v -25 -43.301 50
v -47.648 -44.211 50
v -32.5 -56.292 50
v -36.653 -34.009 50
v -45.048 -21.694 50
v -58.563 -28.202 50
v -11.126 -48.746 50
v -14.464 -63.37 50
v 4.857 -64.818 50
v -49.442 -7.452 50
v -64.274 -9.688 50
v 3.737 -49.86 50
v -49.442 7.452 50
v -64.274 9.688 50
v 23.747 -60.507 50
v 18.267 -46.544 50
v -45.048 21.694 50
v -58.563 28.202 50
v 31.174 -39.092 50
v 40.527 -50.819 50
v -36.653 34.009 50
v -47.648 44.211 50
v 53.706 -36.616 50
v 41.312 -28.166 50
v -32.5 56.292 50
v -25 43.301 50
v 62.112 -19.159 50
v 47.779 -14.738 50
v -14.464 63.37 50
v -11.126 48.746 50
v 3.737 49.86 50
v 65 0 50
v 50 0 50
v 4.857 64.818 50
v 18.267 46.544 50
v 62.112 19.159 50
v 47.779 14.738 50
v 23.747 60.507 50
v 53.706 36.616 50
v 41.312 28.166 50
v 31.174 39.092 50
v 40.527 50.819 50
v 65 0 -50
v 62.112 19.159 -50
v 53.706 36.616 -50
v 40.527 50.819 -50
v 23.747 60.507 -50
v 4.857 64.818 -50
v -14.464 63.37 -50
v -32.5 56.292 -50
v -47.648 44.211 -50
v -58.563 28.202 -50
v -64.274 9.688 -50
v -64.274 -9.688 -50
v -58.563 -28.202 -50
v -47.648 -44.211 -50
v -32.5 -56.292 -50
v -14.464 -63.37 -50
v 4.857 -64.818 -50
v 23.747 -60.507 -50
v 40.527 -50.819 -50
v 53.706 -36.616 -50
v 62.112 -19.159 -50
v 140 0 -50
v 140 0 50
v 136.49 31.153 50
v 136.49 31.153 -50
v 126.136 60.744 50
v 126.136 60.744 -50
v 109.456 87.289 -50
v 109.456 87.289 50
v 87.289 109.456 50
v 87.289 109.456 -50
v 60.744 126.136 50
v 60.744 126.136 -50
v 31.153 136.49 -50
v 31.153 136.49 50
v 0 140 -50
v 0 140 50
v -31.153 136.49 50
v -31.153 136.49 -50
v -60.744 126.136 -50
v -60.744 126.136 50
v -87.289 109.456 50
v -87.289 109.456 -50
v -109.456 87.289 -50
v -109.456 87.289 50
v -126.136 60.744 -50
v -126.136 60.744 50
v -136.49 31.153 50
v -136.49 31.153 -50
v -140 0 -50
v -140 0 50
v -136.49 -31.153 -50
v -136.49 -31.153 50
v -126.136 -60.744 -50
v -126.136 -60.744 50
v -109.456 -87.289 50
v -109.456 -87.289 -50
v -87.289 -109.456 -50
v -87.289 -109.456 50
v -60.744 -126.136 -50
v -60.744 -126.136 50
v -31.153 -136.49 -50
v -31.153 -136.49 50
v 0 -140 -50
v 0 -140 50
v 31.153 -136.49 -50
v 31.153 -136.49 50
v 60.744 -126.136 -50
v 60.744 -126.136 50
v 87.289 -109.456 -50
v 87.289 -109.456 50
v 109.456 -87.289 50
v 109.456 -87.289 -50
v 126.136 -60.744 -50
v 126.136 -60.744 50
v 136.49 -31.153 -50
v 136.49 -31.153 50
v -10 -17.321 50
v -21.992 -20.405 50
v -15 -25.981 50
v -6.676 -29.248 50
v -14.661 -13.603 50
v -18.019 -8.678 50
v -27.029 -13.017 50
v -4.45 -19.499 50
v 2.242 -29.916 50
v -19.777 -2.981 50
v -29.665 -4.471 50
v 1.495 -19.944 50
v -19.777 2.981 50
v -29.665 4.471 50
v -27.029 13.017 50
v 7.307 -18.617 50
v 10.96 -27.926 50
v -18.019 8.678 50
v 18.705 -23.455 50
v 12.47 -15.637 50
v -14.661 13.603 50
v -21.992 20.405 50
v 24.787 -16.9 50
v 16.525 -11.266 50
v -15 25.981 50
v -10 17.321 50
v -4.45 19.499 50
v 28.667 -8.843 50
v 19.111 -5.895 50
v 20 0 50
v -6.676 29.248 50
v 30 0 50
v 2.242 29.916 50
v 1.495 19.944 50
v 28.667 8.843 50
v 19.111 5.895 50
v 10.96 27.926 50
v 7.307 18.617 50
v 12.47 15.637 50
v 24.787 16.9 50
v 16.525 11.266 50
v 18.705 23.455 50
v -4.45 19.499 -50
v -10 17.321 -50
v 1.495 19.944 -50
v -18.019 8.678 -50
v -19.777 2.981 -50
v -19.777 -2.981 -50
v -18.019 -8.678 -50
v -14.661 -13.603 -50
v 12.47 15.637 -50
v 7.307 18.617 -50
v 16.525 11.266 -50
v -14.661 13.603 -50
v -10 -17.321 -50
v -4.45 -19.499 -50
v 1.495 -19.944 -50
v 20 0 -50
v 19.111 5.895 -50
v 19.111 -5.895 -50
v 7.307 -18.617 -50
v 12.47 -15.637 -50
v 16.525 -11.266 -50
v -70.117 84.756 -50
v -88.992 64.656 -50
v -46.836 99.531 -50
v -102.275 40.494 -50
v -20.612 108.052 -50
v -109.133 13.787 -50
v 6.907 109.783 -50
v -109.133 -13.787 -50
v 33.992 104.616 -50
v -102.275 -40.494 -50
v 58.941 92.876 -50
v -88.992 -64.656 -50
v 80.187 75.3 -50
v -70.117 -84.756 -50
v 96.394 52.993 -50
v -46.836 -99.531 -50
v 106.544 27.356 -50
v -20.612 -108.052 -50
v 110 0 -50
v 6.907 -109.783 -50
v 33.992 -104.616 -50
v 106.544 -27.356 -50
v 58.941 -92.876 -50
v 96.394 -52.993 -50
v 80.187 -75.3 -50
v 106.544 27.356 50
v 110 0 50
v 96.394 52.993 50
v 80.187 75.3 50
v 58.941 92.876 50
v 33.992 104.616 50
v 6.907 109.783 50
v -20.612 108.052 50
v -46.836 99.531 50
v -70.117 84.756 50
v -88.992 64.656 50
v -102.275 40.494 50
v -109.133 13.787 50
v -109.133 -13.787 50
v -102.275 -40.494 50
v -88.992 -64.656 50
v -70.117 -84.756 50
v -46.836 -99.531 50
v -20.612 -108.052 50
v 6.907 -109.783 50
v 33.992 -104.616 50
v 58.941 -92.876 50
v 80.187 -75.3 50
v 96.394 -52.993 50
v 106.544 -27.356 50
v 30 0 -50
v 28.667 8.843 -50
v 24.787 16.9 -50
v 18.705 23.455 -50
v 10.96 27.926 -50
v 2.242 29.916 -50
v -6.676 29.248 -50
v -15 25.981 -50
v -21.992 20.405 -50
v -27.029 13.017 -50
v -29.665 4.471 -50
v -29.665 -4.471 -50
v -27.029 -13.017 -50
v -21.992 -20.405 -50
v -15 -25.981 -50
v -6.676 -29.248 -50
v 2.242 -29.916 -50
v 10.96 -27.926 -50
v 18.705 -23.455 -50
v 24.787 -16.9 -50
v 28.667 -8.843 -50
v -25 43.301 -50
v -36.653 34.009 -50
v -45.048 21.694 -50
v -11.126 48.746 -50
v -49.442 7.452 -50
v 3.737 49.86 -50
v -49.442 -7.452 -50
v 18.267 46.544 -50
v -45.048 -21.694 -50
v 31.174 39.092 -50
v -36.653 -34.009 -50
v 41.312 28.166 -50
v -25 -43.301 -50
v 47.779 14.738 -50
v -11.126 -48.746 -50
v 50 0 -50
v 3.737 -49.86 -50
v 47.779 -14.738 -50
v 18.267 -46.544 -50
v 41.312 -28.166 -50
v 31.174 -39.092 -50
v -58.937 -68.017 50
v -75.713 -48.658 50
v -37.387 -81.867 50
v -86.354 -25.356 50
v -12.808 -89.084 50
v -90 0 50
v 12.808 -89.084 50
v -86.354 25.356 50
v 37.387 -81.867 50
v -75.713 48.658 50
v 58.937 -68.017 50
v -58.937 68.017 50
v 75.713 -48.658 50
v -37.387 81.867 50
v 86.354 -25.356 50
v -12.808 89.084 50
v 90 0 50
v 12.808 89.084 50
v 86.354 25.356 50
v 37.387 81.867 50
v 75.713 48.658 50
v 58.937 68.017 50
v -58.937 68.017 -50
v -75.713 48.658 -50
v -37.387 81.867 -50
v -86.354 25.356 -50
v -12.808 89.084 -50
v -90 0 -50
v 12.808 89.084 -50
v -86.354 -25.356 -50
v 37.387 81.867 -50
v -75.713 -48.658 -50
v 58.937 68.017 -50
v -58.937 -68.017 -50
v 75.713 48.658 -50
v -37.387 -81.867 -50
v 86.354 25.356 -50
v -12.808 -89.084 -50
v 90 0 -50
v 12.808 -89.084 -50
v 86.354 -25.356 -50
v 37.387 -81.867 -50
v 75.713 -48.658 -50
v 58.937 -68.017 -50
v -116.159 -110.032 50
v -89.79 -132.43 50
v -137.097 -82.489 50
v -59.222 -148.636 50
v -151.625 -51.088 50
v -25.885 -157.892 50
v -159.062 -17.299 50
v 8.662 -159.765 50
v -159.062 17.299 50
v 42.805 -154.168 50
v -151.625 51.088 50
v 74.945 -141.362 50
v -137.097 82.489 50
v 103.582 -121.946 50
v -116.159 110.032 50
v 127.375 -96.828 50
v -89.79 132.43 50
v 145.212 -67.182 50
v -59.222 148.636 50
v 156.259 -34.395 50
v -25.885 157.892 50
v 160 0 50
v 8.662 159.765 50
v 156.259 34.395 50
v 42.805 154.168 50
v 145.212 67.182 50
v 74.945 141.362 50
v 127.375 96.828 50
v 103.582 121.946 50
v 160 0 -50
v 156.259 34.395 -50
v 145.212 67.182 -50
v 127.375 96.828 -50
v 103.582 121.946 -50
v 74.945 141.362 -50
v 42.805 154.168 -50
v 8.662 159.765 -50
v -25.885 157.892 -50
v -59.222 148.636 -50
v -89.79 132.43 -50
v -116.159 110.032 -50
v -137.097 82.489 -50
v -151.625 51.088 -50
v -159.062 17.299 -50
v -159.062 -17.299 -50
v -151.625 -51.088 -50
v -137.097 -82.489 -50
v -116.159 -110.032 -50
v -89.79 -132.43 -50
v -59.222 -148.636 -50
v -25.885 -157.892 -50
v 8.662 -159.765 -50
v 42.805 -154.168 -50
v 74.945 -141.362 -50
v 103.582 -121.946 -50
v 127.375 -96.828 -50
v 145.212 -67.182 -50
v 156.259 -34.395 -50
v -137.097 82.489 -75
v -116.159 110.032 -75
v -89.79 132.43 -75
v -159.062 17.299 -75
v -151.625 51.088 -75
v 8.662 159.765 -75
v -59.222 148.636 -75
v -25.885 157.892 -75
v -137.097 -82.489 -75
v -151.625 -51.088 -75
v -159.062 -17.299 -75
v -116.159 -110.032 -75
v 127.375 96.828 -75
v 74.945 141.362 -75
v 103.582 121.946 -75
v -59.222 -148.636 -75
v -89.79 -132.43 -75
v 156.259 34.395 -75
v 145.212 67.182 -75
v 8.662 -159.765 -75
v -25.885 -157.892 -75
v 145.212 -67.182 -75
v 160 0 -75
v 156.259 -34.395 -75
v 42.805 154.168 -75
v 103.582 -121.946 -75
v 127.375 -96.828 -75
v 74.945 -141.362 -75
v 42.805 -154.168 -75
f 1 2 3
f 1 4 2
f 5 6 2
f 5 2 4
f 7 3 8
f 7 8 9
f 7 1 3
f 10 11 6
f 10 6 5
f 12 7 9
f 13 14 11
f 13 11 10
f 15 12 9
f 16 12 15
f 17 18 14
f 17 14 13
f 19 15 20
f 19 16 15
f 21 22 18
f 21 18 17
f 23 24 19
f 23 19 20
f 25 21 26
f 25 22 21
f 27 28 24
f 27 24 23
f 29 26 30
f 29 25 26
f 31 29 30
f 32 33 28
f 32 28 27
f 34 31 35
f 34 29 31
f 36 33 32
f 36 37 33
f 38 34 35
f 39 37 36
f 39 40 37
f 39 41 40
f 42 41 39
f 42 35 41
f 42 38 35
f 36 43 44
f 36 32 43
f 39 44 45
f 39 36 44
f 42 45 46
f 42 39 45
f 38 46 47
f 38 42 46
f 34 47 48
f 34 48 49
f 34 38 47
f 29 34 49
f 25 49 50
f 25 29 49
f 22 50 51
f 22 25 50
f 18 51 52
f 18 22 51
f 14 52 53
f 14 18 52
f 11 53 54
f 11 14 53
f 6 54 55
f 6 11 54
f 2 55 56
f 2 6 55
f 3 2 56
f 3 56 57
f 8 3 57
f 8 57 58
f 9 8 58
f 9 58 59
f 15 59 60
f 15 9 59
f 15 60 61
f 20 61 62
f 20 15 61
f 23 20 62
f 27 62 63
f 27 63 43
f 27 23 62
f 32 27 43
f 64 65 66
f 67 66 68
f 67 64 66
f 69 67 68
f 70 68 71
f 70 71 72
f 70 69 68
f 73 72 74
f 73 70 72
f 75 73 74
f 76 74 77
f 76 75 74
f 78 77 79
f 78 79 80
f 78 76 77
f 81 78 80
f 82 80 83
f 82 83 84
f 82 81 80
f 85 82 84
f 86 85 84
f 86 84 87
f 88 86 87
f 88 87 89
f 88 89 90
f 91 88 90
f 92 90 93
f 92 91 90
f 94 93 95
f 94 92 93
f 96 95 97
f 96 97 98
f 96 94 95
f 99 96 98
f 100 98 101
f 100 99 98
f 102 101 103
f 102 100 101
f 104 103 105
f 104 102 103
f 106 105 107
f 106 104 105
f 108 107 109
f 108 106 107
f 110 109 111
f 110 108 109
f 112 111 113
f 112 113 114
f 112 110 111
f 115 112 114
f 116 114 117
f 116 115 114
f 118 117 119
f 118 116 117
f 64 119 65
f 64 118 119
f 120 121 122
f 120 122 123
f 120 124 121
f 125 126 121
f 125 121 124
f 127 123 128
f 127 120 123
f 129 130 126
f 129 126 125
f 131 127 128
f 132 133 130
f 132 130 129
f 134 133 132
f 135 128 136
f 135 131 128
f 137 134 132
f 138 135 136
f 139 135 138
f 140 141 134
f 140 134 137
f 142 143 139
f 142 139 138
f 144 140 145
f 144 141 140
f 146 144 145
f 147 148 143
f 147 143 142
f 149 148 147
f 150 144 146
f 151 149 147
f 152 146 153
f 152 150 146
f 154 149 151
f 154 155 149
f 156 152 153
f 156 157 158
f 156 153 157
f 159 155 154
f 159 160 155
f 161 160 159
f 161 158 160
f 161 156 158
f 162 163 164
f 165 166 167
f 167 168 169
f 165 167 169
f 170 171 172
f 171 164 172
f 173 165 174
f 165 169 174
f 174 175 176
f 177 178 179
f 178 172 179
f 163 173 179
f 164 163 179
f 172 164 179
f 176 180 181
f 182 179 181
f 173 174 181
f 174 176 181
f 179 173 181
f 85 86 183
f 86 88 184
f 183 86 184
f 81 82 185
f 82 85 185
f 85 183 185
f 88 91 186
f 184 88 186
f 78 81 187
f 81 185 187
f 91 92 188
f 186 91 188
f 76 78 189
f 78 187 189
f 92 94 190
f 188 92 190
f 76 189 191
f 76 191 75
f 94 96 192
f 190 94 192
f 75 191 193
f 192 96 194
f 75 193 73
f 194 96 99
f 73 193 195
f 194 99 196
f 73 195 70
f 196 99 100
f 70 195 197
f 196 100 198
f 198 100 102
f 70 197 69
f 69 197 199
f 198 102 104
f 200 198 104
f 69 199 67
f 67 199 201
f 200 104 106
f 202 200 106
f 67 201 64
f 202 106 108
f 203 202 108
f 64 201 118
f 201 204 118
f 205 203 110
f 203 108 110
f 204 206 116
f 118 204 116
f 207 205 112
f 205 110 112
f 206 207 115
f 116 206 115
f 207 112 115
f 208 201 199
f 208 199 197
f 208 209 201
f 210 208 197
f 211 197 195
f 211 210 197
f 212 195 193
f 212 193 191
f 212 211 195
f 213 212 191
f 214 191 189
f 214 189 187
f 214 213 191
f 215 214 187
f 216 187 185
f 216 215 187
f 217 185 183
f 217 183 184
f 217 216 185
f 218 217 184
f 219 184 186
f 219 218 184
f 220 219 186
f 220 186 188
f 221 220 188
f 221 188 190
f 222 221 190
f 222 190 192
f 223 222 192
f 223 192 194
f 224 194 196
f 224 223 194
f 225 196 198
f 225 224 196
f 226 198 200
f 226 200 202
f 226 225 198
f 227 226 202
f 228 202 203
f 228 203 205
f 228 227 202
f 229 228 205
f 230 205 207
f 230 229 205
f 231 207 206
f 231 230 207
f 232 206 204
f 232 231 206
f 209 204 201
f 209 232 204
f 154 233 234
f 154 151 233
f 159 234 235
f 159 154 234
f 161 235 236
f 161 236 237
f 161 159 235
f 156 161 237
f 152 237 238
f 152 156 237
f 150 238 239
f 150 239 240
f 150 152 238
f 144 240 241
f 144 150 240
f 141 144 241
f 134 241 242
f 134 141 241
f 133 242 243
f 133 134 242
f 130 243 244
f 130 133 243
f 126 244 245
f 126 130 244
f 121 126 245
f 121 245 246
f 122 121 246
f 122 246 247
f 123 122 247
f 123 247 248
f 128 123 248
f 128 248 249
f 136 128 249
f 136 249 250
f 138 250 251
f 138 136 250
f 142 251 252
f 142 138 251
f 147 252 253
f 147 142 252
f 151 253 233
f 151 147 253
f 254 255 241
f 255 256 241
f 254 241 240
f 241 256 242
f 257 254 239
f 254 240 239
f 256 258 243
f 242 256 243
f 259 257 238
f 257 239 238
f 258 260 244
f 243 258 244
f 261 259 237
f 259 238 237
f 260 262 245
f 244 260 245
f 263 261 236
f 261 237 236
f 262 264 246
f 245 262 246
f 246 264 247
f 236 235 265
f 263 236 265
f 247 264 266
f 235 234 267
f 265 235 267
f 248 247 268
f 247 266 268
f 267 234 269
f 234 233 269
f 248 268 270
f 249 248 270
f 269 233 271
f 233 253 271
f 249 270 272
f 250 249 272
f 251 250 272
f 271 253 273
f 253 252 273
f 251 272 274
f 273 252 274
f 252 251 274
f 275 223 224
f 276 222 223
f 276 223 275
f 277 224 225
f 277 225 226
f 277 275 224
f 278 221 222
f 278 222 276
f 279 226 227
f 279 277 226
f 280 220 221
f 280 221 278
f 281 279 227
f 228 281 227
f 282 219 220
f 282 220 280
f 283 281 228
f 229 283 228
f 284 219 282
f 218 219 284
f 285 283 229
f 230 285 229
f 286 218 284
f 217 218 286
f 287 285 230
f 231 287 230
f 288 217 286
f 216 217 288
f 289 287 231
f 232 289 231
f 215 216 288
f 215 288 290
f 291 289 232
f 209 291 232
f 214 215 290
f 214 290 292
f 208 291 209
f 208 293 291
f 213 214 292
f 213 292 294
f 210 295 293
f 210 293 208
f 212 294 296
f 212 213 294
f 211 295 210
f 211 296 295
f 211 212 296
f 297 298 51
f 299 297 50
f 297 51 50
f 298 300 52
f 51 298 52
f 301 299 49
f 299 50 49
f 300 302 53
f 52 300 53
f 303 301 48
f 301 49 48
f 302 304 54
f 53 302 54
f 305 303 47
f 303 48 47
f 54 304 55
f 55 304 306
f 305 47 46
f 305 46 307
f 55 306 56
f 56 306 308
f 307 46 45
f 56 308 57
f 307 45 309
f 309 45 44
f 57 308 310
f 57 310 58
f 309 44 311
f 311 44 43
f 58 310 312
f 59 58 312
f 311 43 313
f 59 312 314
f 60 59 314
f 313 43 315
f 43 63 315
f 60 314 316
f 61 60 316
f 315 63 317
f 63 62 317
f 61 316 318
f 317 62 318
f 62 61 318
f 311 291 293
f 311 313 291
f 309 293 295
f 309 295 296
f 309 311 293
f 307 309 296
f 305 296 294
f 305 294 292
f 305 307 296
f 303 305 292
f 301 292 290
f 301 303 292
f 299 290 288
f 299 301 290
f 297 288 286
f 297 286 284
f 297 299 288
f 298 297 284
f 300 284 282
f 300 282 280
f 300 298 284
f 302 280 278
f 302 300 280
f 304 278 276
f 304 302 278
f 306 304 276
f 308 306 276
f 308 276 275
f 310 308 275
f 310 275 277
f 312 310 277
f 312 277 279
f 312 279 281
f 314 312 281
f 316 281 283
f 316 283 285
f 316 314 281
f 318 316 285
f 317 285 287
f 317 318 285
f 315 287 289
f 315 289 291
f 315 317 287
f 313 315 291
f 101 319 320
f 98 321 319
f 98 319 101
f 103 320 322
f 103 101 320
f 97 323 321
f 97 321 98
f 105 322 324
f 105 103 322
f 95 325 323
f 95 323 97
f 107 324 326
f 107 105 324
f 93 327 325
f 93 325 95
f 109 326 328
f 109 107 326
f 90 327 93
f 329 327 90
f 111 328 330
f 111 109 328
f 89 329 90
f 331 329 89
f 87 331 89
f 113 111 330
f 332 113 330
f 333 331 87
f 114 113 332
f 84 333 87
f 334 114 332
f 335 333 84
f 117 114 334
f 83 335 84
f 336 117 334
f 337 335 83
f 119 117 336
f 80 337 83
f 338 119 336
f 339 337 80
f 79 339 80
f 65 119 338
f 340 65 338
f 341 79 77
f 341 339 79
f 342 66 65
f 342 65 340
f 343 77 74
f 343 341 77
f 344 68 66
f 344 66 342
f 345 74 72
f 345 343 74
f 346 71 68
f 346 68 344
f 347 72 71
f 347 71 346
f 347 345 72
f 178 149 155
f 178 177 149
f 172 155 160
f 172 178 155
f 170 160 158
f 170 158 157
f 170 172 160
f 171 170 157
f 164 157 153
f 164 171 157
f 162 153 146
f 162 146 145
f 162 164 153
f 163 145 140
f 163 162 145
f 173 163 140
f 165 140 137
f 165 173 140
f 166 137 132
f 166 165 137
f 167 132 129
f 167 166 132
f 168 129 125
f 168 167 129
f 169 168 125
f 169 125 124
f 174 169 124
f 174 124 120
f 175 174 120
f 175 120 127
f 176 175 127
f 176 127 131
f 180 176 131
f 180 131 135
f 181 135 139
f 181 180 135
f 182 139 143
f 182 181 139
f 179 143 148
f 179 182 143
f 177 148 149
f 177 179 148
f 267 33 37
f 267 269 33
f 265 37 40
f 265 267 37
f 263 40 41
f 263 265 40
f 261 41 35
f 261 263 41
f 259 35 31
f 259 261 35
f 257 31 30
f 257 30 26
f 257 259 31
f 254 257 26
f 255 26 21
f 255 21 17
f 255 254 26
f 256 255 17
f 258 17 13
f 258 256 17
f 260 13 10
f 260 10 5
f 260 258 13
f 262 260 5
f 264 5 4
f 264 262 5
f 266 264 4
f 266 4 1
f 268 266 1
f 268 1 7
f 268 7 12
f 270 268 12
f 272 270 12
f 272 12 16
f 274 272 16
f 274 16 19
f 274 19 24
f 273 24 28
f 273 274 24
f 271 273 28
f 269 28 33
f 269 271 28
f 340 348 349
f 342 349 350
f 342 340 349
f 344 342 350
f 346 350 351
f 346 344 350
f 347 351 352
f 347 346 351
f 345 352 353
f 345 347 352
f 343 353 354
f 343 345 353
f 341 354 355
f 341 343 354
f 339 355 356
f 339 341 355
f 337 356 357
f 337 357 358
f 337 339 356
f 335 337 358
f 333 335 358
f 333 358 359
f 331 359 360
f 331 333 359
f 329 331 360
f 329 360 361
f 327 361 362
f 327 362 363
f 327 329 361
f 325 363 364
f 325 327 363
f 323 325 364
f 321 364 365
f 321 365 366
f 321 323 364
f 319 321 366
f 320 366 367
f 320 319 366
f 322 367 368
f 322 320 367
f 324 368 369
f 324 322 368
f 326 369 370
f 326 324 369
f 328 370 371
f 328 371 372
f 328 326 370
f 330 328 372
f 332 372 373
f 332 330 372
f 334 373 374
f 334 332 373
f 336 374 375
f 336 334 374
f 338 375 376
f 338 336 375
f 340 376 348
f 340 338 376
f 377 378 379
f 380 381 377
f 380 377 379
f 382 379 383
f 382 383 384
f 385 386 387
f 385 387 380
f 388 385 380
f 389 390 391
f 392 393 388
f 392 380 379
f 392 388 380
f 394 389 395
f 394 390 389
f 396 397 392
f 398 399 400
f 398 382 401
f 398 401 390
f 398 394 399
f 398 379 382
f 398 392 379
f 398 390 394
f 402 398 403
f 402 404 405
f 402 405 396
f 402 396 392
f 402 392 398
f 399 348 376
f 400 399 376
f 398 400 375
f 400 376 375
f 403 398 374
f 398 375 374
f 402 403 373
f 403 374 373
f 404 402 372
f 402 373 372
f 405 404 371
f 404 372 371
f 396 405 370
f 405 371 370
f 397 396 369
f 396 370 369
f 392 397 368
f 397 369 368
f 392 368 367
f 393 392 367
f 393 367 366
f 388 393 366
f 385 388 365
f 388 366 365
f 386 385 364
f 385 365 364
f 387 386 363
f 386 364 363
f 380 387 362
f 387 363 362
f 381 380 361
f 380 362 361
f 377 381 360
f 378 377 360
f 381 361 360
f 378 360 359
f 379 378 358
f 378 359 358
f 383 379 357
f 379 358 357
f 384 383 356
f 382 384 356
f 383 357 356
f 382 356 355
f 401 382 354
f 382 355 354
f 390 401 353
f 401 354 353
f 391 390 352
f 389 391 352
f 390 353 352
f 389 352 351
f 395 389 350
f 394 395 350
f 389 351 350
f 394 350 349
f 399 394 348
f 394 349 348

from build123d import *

# Parameters (mm, degrees)
F0_R     = 160
F0_R_2   = 140
F1_DEPTH = 50
F0_R_3   = 65
F0_R_4   = 50
F0_R_5   = 30
F0_R_6   = 20
F0_R_7   = 110
F0_R_8   = 90
F3_R     = 160
F4_DEPTH = 25


with BuildPart() as f1:
    # F0 (on Top) → F1 (new body, symmetric)
    with BuildSketch(Plane.XY):
        Circle(F0_R)
        Circle(F0_R_2, mode=Mode.SUBTRACT)
    extrude(amount=F1_DEPTH, both=True)



with BuildPart() as f1b:
    # F0 (on Top) → F1, piece 2 (new body, symmetric)
    with BuildSketch(Plane.XY):
        Circle(F0_R_3)
        Circle(F0_R_4, mode=Mode.SUBTRACT)
    extrude(amount=F1_DEPTH, both=True)


with BuildPart() as f1c:
    # F0 (on Top) → F1, piece 3 (new body, symmetric)
    with BuildSketch(Plane.XY):
        Circle(F0_R_5)
        Circle(F0_R_6, mode=Mode.SUBTRACT)
    extrude(amount=F1_DEPTH, both=True)


with BuildPart() as f1d:
    # F0 (on Top) → F1, piece 4 (new body, symmetric)
    with BuildSketch(Plane.XY):
        Circle(F0_R_7)
        Circle(F0_R_8, mode=Mode.SUBTRACT)
    extrude(amount=F1_DEPTH, both=True)


with BuildPart() as f1_1:
    add(f1.part)

    add(f1b.part)  # F4 merges F1b

    add(f1c.part)  # F4 merges F1c

    add(f1d.part)  # F4 merges F1d
    # F3 (on face) → F4 (join)
    with BuildSketch(Plane(origin=(0, 0, -50), x_dir=(1, 0, 0), z_dir=(0, 0, -1))):
        Circle(F3_R)
    extrude(amount=F4_DEPTH)


solid = f1_1.part
